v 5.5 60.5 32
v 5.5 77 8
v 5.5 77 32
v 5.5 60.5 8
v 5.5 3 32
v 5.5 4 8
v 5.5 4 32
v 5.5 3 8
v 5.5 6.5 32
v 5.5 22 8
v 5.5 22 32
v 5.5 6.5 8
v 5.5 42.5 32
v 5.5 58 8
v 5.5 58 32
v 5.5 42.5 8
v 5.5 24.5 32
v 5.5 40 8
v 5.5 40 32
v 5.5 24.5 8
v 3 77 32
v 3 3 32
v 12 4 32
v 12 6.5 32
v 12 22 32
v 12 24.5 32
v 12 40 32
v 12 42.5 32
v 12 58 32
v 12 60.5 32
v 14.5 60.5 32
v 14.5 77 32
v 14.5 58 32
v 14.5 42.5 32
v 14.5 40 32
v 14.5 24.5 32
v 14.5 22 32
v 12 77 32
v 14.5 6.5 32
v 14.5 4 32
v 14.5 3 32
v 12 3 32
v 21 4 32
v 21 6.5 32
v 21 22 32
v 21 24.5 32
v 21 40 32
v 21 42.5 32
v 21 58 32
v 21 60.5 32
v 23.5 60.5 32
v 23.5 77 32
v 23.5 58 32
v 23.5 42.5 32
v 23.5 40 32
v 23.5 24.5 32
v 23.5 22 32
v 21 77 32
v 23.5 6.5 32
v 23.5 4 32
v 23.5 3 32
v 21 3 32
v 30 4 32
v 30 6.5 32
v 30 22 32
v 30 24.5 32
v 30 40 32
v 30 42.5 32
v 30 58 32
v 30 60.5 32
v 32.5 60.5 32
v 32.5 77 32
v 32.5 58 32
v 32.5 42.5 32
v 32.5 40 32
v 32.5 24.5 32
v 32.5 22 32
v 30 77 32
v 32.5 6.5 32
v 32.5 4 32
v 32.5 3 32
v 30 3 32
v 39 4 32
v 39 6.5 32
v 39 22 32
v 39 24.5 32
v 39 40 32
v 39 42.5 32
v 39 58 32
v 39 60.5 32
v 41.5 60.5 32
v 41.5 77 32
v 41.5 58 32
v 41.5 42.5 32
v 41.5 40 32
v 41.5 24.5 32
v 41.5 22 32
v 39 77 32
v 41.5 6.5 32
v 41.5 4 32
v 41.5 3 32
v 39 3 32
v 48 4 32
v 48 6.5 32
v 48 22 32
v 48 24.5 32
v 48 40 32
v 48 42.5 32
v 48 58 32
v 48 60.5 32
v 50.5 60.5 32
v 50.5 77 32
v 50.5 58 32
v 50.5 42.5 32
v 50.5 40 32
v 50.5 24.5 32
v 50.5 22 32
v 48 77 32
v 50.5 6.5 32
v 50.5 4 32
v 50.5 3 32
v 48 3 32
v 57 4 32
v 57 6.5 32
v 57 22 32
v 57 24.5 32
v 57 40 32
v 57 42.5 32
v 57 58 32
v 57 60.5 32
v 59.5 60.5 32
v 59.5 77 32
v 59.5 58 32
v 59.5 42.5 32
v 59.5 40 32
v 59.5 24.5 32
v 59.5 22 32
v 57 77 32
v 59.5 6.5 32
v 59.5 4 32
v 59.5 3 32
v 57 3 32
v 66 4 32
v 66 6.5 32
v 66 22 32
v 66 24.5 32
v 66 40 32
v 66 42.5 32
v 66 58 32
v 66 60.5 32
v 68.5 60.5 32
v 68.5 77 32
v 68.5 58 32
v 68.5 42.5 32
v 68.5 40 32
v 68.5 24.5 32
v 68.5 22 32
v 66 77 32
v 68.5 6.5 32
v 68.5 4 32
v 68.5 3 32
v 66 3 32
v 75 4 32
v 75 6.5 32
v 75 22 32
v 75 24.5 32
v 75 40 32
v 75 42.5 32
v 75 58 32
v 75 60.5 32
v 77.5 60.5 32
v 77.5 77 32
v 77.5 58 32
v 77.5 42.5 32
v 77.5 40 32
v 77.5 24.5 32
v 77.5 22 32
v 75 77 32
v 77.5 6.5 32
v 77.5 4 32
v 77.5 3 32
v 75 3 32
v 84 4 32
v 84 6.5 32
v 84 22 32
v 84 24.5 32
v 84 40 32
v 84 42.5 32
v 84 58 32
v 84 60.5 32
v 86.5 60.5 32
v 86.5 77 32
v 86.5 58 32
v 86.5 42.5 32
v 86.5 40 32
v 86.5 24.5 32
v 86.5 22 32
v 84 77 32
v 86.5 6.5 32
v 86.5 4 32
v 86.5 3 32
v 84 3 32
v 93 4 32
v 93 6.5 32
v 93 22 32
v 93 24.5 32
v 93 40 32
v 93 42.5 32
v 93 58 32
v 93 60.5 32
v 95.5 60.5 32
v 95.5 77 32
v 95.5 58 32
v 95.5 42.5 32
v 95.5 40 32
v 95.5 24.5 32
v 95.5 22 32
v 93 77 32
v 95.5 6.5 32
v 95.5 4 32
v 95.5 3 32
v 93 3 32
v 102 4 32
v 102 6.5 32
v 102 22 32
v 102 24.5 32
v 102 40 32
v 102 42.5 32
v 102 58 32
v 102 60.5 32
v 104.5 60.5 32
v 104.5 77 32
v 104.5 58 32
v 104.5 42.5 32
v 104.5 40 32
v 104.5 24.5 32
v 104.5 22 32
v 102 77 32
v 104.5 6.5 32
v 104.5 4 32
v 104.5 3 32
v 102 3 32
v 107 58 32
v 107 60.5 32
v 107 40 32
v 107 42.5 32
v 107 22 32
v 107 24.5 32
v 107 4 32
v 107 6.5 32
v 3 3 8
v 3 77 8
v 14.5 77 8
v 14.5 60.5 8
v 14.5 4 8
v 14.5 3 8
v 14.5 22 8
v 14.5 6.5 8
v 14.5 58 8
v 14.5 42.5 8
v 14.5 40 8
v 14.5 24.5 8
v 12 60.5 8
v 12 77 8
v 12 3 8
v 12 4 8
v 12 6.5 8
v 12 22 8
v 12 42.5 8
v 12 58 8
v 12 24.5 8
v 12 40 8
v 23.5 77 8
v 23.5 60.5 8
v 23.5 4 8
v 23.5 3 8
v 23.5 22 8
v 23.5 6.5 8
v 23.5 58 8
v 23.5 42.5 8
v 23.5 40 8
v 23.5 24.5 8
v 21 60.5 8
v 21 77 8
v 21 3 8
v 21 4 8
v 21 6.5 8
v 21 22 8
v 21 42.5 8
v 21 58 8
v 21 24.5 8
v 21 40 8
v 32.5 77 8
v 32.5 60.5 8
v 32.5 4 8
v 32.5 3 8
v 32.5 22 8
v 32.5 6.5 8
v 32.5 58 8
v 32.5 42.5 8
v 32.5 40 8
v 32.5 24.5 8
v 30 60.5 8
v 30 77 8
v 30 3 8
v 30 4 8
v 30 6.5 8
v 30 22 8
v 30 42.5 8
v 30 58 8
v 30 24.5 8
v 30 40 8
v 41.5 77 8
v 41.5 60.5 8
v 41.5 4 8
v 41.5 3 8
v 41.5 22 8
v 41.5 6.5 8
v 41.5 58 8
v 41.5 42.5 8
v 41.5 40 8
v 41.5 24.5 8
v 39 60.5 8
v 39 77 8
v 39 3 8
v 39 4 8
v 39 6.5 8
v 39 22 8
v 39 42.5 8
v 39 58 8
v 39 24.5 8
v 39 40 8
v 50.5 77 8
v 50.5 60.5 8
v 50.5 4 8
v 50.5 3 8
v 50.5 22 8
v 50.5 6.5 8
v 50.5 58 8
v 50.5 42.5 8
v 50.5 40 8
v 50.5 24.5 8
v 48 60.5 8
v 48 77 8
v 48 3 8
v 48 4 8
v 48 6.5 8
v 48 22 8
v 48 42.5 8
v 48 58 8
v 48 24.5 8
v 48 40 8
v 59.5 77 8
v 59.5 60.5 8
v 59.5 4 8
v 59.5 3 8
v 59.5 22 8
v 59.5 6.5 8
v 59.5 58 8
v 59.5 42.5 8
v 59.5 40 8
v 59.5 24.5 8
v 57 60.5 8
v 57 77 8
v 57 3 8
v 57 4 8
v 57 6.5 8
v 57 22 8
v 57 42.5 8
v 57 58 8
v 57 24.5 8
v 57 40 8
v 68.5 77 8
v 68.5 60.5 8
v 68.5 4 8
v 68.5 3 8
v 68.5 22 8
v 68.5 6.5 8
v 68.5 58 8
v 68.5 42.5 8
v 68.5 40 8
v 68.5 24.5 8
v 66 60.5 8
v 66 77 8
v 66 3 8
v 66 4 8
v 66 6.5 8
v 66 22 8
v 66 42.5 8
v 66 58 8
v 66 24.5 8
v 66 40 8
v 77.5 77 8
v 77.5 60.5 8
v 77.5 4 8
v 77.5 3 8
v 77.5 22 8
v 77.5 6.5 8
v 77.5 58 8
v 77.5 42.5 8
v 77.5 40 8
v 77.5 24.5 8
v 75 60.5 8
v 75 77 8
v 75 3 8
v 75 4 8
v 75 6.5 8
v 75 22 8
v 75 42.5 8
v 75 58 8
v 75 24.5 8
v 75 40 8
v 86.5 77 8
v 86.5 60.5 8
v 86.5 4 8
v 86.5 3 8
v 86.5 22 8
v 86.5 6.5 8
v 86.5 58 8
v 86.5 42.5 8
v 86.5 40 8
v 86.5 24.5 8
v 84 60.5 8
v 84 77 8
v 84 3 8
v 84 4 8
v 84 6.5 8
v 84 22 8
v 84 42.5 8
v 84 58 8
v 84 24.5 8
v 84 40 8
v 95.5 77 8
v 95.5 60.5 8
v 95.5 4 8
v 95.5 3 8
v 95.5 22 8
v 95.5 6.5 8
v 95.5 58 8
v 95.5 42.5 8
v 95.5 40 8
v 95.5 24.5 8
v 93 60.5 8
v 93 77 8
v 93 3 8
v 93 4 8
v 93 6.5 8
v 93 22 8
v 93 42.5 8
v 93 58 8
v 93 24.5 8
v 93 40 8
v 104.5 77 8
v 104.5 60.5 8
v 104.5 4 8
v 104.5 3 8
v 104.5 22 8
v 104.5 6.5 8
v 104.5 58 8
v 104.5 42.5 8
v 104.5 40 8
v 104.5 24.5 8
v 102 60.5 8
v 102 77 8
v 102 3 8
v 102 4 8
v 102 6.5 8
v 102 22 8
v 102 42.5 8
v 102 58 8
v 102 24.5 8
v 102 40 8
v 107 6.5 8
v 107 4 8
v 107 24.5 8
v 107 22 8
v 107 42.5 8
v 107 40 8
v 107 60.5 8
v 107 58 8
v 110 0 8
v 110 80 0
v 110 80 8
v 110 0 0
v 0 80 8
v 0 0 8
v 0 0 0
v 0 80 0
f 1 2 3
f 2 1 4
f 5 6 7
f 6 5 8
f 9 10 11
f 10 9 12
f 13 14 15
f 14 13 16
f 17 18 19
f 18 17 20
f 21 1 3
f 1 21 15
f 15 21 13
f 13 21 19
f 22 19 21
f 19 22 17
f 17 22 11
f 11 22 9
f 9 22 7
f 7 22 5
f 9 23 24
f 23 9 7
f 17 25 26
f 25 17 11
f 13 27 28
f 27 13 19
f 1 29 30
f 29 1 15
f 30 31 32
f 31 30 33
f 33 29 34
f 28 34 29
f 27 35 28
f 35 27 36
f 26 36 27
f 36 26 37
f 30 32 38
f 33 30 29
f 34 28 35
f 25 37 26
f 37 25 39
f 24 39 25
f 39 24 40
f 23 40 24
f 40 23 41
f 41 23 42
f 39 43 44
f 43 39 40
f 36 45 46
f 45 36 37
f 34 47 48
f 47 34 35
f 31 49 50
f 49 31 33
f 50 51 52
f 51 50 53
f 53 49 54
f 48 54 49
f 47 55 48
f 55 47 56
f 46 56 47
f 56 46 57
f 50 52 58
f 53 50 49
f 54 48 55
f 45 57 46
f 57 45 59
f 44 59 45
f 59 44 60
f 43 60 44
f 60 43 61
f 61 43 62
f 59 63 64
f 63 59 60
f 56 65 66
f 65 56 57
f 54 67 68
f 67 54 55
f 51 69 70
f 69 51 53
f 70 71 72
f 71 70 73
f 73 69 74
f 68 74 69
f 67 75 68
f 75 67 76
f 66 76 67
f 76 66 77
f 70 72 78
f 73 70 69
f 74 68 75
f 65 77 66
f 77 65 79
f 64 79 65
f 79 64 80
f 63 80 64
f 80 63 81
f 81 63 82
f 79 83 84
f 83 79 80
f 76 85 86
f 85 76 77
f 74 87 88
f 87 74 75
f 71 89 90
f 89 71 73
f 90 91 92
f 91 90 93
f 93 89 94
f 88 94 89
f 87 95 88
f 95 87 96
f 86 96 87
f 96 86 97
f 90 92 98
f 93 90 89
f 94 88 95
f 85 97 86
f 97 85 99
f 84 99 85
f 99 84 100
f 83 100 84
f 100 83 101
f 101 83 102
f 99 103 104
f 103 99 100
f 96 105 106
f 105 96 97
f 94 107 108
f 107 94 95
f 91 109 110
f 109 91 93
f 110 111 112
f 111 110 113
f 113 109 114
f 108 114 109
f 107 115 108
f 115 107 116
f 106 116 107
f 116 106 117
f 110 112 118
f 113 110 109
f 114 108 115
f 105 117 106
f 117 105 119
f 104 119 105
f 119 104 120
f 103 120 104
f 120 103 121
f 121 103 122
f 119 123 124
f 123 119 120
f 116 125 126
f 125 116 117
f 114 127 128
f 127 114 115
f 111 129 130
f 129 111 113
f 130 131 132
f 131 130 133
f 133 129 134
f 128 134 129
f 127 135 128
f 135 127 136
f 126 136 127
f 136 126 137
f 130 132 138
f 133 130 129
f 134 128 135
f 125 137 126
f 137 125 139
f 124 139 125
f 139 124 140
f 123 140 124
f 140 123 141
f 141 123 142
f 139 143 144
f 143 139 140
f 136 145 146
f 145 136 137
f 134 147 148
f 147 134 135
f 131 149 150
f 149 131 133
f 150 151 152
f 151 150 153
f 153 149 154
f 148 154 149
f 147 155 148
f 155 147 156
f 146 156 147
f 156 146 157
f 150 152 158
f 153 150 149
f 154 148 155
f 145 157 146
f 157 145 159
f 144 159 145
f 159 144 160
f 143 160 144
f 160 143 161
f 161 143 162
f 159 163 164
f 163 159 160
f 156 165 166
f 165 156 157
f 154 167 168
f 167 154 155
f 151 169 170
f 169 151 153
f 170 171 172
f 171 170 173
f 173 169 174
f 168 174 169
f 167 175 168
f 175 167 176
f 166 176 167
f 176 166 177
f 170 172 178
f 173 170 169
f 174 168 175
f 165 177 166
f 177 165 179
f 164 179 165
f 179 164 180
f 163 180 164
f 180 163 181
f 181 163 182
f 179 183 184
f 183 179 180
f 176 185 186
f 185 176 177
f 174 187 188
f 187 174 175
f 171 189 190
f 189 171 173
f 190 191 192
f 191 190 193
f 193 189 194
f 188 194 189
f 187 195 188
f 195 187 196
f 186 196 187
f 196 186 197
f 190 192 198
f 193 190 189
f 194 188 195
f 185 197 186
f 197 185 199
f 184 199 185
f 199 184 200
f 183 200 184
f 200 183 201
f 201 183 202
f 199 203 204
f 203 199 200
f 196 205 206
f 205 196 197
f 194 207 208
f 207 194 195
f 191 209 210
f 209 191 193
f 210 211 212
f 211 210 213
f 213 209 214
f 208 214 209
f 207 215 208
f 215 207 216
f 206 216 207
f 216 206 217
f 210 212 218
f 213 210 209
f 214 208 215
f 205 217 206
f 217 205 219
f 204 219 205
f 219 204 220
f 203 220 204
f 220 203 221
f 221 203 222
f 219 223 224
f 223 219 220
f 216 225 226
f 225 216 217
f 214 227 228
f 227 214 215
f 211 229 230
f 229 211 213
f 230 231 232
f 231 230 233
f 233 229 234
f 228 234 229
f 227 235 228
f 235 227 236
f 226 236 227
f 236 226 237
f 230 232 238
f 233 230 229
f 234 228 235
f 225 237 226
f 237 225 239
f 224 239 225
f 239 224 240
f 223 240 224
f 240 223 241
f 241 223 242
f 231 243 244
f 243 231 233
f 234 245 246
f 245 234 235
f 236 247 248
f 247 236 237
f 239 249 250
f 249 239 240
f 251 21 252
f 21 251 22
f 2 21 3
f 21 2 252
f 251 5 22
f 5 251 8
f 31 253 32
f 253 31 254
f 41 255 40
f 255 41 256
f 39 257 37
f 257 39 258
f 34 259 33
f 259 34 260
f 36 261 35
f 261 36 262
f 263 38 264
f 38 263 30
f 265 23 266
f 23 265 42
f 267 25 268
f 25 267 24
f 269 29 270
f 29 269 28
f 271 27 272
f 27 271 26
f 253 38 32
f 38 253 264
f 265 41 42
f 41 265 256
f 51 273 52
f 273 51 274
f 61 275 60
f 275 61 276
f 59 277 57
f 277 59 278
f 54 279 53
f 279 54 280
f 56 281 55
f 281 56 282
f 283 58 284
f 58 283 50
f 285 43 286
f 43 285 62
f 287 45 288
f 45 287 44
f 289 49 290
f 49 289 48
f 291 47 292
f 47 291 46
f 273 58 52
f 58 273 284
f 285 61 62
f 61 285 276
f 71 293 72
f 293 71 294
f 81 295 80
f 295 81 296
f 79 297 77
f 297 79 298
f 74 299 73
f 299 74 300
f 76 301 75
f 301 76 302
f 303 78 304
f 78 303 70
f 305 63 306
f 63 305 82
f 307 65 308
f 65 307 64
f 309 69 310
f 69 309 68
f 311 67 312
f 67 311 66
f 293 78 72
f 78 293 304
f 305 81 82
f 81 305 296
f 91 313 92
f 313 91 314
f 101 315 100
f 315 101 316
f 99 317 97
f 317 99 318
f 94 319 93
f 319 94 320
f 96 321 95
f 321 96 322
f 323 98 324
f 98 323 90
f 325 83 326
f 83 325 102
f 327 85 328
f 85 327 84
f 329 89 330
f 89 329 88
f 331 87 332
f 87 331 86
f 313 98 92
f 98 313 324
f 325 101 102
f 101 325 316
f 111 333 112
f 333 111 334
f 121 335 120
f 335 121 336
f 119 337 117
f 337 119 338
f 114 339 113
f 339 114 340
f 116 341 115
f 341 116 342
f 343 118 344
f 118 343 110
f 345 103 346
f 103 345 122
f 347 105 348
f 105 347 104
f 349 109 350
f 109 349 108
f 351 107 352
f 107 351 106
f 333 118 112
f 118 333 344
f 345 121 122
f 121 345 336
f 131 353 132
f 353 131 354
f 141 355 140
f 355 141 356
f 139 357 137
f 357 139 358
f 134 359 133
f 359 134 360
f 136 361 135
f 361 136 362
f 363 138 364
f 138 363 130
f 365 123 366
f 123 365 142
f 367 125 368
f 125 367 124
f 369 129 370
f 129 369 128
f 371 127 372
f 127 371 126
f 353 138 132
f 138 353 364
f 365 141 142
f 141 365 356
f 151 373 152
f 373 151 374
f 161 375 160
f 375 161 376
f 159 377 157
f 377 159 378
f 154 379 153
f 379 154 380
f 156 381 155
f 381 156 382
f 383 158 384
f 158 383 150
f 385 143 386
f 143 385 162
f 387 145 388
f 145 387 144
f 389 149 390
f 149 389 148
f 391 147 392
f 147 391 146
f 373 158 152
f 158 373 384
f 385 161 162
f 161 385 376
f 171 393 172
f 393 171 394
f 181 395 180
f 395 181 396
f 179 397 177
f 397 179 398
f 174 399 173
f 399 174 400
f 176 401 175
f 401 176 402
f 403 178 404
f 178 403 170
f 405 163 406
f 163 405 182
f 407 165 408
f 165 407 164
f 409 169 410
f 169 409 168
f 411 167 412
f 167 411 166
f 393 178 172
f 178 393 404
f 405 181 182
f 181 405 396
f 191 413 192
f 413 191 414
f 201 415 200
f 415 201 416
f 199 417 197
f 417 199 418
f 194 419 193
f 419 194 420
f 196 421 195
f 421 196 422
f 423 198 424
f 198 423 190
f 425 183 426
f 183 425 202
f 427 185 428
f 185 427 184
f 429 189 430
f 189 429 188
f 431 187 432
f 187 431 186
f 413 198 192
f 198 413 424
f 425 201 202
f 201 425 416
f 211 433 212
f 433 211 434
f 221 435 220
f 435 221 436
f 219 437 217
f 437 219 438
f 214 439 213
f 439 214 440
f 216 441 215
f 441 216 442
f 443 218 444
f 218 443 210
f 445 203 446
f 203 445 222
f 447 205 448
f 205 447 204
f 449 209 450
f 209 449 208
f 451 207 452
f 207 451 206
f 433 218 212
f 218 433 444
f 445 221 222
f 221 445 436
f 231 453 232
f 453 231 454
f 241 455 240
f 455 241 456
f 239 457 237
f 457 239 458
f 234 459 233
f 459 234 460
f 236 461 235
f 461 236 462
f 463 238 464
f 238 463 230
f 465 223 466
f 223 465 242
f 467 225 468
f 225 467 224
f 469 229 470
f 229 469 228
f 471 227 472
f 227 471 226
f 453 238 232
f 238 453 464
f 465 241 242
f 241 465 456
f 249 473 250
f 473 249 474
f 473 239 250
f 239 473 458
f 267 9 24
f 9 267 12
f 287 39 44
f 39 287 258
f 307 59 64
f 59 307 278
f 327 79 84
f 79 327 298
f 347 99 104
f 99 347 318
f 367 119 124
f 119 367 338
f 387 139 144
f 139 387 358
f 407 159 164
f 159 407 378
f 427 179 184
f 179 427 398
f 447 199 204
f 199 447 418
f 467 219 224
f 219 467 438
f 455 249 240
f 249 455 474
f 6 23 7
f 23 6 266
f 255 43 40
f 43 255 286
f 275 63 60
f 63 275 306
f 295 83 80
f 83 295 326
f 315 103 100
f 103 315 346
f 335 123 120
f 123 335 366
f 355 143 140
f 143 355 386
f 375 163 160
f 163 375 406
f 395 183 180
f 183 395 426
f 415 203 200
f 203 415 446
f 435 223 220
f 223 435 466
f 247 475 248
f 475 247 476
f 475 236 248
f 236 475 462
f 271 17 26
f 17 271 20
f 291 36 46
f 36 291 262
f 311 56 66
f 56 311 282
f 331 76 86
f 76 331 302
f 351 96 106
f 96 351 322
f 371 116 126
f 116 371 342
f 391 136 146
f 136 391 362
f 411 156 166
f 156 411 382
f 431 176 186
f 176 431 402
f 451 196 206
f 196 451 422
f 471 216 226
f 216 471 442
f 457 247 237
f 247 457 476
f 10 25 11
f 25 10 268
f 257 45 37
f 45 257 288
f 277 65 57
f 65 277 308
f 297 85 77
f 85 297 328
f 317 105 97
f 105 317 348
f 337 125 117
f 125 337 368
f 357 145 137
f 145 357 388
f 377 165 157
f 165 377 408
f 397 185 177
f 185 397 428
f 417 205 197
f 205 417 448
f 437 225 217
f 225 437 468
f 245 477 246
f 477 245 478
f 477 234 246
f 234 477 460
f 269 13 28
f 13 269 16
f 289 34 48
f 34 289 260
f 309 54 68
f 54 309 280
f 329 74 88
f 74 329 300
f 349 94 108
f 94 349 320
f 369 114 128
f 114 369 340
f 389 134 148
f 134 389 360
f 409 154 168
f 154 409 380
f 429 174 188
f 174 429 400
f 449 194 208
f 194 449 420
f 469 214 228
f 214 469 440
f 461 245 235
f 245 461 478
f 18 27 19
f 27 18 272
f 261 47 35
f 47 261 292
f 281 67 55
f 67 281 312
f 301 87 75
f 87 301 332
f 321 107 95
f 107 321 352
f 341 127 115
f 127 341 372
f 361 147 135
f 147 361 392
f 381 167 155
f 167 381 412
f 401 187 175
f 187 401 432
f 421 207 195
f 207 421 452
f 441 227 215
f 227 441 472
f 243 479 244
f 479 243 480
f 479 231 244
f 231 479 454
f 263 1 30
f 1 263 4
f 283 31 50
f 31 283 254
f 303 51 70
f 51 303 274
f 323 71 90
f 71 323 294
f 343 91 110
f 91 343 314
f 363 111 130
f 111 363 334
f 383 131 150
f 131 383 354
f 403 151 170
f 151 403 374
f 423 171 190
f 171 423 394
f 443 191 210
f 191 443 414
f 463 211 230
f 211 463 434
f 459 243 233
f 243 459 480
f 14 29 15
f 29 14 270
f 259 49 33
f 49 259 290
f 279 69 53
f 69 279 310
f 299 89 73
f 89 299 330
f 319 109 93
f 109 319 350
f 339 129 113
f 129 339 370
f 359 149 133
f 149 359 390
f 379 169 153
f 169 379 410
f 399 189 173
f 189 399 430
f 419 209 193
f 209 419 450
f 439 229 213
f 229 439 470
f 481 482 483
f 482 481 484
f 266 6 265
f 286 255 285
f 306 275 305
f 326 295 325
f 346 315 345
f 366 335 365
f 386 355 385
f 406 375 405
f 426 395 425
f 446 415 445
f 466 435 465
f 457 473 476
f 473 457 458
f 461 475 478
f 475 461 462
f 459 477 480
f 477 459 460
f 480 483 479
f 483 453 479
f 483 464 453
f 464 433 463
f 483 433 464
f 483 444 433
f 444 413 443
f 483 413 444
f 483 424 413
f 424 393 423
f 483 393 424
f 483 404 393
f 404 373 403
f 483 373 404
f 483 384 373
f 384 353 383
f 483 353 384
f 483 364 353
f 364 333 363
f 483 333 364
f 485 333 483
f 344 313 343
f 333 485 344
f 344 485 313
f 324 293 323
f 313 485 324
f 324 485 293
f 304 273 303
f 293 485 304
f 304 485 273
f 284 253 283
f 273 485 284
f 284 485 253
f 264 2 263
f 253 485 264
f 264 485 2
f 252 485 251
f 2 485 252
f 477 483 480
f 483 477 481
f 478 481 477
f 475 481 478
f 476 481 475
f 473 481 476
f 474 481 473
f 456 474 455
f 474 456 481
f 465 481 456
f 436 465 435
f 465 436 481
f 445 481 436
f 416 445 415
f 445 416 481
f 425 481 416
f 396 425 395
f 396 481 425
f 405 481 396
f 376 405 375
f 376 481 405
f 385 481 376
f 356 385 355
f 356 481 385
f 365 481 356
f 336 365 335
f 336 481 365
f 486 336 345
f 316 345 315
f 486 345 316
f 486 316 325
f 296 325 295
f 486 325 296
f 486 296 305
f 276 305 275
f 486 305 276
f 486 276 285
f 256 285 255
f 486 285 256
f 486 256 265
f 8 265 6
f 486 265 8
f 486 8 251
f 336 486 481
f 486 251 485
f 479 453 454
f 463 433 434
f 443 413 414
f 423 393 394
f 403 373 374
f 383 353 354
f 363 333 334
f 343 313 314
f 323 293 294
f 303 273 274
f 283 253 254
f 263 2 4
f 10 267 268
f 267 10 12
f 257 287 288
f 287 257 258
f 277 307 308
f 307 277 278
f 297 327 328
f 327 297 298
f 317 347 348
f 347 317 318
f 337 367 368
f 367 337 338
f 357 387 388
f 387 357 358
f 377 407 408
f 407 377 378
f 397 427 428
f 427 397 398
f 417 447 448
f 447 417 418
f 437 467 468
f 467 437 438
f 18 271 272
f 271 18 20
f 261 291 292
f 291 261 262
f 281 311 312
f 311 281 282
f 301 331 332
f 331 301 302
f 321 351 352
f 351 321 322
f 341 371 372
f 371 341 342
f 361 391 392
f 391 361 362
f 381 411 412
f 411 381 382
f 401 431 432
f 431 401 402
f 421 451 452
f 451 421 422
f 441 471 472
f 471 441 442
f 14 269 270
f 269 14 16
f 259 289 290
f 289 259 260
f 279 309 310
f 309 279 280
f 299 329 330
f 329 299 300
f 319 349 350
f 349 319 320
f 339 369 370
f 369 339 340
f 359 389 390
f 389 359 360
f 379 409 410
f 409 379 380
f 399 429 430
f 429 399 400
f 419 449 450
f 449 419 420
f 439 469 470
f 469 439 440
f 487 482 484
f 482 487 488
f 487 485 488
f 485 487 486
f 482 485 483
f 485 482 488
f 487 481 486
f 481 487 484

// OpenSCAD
$fn = 32;

// ----------------------------------------------------------------------
// Heatsink: cross fin block
// ----------------------------------------------------------------------

// --- parameters (mm) ---
base_l = 110;             // base length, X
base_w = 80;              // base width, Y
base_t = 8;               // base plate thickness
fin_h = 25;               // fin height above the base
fin_t = 2.5;              // fin thickness
edge = 3;                 // margin from the base ends
pitch = 9;                // fin pitch
rib_pitch = 18;           // cross rib pitch

n_fins = floor((base_l - 2 * edge - fin_t) / pitch) + 1;  // fin count
total_h = base_t + fin_h - 1;  // overall height
n_ribs = floor((base_w - 2 * edge) / rib_pitch);  // rib count

union() {
  cube([base_l, base_w, base_t]);
  for (i = [0 : n_fins - 1])
    translate([edge + i * pitch, edge, base_t - 1])
      cube([fin_t, base_w - 2 * edge, fin_h]);
  for (i = [0 : n_ribs - 1])
    translate([edge, edge + 1 + i * rib_pitch, base_t - 1])
      cube([base_l - 2 * edge, fin_t, fin_h]);
}
